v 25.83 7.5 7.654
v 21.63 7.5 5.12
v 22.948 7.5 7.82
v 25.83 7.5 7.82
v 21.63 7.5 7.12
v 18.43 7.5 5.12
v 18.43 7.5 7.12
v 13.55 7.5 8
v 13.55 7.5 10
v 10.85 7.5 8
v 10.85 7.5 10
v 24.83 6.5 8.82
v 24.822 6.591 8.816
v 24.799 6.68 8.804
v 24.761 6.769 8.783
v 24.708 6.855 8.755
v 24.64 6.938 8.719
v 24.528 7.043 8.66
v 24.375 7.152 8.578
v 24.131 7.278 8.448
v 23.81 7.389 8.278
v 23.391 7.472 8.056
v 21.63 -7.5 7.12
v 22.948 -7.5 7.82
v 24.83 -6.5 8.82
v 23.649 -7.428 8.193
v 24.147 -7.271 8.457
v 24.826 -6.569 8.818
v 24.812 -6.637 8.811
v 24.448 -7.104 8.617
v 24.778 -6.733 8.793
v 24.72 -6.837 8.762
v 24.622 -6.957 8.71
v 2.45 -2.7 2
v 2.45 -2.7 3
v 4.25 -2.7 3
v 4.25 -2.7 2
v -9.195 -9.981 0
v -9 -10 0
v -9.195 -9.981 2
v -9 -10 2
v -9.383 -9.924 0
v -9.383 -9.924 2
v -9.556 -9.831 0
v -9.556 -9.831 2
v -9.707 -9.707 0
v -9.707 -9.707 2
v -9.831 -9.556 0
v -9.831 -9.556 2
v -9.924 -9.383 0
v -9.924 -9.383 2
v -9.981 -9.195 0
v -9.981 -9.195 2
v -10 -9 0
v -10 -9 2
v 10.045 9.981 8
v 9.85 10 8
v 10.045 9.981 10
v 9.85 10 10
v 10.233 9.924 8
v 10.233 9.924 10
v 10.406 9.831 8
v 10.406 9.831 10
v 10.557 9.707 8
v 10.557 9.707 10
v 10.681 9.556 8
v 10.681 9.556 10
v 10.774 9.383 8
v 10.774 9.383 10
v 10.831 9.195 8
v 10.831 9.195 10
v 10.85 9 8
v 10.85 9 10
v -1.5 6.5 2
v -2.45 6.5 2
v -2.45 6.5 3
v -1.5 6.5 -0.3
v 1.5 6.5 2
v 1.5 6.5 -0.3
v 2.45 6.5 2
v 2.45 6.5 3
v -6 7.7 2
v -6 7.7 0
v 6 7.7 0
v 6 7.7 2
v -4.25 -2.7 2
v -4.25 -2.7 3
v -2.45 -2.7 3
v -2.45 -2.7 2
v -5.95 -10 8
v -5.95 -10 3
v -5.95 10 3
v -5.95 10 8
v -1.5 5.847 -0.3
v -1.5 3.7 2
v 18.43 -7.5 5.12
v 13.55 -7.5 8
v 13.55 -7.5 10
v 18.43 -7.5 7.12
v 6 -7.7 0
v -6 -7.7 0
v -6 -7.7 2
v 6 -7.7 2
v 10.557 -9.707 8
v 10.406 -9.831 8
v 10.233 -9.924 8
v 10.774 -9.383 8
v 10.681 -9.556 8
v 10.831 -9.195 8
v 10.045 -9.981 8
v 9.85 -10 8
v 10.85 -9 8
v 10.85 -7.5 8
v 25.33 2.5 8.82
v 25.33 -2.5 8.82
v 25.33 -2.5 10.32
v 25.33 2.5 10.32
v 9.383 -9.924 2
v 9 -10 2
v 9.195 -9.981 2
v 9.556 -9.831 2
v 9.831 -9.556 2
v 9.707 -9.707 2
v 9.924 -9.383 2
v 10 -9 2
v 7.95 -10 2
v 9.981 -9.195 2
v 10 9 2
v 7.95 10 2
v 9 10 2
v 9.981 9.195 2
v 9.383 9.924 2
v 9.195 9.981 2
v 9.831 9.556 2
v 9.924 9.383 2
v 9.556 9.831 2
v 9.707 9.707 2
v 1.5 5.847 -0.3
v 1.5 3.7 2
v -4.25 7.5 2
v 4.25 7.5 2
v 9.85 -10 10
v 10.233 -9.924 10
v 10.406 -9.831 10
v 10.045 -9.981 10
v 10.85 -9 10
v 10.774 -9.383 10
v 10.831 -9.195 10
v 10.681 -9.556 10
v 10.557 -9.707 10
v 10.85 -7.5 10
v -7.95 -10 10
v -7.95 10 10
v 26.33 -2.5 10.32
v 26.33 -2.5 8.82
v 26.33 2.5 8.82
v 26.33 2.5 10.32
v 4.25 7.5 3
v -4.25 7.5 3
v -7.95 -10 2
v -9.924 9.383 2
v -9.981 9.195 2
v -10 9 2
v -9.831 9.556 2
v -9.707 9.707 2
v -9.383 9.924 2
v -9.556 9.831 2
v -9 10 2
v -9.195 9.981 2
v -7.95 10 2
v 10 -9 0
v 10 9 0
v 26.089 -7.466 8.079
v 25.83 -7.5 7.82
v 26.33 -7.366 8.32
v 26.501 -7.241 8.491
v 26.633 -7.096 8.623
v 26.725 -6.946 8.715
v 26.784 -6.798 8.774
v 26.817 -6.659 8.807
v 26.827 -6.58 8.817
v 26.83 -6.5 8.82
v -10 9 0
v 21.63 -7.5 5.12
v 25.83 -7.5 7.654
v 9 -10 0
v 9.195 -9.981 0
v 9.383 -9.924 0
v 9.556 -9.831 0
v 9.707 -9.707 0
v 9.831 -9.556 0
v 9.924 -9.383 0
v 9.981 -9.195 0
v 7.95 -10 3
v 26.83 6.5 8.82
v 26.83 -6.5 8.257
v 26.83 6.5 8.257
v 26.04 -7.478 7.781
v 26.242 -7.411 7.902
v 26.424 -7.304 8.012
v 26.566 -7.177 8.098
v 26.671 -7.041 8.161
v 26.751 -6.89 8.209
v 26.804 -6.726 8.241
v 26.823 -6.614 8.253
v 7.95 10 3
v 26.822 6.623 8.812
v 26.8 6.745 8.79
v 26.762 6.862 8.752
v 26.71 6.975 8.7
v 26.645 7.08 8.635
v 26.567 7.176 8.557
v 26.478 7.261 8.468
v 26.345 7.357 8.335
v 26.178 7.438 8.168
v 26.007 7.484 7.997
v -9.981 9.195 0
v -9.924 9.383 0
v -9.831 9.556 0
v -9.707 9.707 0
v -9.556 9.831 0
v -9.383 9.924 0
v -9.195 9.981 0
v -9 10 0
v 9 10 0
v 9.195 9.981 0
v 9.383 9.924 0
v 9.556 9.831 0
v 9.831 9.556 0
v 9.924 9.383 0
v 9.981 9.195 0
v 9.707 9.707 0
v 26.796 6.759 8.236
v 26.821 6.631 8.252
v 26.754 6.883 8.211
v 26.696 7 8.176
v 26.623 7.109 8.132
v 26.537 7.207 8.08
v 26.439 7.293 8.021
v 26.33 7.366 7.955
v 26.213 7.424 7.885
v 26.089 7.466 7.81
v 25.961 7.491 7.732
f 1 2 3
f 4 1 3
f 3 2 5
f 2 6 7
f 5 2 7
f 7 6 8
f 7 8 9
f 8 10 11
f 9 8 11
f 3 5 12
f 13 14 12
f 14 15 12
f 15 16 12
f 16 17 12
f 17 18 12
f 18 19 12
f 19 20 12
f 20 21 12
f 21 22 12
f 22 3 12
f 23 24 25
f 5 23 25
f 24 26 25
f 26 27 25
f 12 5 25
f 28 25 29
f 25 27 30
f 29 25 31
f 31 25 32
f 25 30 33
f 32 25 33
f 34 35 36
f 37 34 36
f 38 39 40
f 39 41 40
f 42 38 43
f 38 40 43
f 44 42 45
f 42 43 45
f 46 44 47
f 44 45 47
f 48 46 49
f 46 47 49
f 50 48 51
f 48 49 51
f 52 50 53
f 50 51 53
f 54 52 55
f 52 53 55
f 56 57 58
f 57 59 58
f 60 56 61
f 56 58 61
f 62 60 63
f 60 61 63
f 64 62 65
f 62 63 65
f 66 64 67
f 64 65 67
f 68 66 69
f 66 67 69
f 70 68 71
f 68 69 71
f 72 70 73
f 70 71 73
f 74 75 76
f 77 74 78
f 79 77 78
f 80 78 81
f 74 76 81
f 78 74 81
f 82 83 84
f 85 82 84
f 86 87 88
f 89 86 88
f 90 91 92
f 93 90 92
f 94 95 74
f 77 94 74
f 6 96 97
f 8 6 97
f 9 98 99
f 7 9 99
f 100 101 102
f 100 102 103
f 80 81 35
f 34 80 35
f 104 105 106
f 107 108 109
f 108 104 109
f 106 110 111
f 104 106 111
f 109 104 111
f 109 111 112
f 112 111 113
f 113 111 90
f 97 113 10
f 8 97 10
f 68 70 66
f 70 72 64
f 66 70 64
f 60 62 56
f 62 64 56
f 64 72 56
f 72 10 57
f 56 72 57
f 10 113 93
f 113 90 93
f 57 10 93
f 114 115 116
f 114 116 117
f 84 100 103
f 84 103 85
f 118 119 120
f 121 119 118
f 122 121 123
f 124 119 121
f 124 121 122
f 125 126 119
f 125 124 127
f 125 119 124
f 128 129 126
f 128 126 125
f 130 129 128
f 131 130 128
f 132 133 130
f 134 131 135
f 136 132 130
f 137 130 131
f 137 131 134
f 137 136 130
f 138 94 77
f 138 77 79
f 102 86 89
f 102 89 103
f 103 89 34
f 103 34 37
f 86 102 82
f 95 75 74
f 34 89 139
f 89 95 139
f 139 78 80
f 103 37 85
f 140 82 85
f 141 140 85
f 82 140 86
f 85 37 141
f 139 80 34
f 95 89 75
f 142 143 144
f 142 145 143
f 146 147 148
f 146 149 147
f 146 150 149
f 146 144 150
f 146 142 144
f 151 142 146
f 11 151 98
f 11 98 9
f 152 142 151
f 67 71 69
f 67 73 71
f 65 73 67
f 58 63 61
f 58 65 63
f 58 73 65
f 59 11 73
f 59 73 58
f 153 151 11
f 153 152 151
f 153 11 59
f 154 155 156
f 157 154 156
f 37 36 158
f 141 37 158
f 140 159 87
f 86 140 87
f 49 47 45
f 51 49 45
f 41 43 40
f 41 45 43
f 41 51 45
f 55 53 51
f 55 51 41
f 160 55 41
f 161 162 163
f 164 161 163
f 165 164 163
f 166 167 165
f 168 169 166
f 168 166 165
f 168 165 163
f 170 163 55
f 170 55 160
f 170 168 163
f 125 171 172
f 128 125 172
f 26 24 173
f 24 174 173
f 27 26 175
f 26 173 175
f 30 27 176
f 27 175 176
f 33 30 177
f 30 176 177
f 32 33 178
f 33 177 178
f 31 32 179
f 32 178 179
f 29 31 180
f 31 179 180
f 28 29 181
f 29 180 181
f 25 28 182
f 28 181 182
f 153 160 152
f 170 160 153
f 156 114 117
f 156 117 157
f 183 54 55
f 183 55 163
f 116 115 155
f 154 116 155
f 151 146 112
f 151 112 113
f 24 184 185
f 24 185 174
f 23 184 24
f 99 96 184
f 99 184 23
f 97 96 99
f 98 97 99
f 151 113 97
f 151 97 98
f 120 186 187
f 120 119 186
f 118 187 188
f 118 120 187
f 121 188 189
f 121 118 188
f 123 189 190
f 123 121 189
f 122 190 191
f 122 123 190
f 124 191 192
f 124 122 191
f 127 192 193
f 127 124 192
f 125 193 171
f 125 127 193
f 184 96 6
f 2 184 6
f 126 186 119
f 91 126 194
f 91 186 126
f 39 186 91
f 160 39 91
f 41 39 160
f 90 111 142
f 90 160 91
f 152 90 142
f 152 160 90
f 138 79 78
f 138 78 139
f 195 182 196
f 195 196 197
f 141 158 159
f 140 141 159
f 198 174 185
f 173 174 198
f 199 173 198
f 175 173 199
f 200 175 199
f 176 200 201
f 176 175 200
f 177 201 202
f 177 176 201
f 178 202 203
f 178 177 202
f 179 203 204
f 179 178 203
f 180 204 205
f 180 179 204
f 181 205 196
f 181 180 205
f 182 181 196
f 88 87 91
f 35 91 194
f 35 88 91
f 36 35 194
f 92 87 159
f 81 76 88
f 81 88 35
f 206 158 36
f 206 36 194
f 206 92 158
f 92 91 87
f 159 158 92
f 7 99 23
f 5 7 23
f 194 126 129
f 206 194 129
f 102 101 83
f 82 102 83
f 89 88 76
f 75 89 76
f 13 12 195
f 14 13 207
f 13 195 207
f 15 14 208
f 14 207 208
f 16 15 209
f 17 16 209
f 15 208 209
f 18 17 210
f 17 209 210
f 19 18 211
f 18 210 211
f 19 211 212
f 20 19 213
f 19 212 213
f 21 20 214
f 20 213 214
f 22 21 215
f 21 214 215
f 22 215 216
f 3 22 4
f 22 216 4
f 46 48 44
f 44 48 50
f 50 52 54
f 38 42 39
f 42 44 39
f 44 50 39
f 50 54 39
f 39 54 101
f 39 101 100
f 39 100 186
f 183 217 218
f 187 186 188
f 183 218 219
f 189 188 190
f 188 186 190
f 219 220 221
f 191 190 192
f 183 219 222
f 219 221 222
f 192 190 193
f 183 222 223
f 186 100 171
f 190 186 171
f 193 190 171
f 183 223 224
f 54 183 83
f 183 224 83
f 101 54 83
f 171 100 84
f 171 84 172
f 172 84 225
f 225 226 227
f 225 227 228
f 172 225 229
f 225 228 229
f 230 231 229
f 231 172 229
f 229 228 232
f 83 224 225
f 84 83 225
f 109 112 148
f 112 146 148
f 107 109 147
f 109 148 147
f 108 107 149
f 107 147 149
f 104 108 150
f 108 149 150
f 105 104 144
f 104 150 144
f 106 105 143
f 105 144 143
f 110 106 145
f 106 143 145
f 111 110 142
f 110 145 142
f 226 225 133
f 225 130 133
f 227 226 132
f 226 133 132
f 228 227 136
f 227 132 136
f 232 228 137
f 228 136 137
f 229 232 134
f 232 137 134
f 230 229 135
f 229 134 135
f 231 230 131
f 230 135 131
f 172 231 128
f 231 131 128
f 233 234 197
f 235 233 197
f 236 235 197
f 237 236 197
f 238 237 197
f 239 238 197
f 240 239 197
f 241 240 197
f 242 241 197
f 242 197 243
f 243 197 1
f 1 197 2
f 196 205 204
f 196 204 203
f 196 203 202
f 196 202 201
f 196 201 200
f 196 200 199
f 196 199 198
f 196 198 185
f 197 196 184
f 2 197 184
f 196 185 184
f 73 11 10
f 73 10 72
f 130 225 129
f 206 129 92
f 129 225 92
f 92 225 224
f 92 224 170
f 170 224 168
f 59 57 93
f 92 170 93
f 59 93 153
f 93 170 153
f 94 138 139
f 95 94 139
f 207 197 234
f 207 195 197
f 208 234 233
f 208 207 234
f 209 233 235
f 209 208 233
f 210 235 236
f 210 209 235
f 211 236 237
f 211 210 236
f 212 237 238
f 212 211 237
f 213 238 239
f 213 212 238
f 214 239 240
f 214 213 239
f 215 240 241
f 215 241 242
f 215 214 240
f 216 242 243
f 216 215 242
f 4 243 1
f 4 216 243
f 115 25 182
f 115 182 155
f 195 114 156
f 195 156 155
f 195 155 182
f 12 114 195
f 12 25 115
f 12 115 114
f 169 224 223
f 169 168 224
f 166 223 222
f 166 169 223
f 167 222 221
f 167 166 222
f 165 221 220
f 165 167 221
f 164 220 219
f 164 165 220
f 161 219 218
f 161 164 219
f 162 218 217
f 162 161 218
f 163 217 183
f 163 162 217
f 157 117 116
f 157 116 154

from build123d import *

# Parameters (mm, degrees)
F0_W      = 20
F0_H      = 20
F0_W_2    = 12
F0_H_2    = 15.4
F1_DEPTH  = 2
F2_W      = 15.9
F2_H      = 20
F3_DEPTH  = 1
F4_W      = 2
F4_H      = 20
F5_DEPTH  = 7
F7_DEPTH  = 3.001
F9_DEPTH  = 2.3
F11_DEPTH = 4
F12_W     = 20
F12_H     = 2
F13_DEPTH = 16.8
F14_W     = 15
F14_H     = 2
F15_DEPTH = 2.7
F16_W     = 15
F16_H     = 2.88
F16_H_2   = 2
F17_DEPTH = 4.88
F19_DEPTH = 17.501
F20_W     = 15
F20_H     = 3.7
F21_DEPTH = 8.4
F23_DEPTH = 17.501
F24_W     = 1
F24_H     = 5
F25_DEPTH = 1.5
F26_R     = 1
F27_R     = 1


with BuildPart() as f1:
    # F0 (on Top) → F1 (new body)
    with BuildSketch(Plane.XY):
        Rectangle(F0_W, F0_H)
        Rectangle(F0_W_2, F0_H_2, mode=Mode.SUBTRACT)
    extrude(amount=F1_DEPTH)

    # F2 (on face) → F3 (join)
    with BuildSketch(Plane.XY.offset(2)):
        Rectangle(F2_W, F2_H)
    extrude(amount=F3_DEPTH)

    # F4 (on face) → F5 (join)
    with BuildSketch(Plane.XY.offset(3)):
        with Locations((-6.95, 0)):
            Rectangle(F4_W, F4_H)
    extrude(amount=F5_DEPTH)

    # F6 (on face) → F7 (cut, through all)
    with BuildSketch(Plane.XY.offset(3)):
        Polygon((0, 7.5), (-4.25, 7.5), (-4.25, -2.7), (-2.45, -2.7), (-2.45, 6.5), (0, 6.5), (2.45, 6.5), (2.45, -2.7), (4.25, -2.7), (4.25, 7.5), align=None)
    extrude(amount=-F7_DEPTH, mode=Mode.SUBTRACT)

    # F8 (on face) → F9 (join)
    with BuildSketch(Plane(origin=(0, 0, 2), x_dir=(1, 0, 0), z_dir=(0, 0, -1))):
        Polygon((1.5, -3.7), (0, -3.7), (-1.5, -3.7), (-1.5, -6.5), (1.5, -6.5), align=None)
    extrude(amount=F9_DEPTH)

    # F10 (on face) → F11 (cut)
    with BuildSketch(Plane.YZ.offset(1.5)):
        Polygon((5.847163, -0.3), (3.7, 2), (3.7, -0.3), align=None)
    extrude(amount=-F11_DEPTH, mode=Mode.SUBTRACT)

    # F12 (on face) → F13 (join)
    with BuildSketch(Plane.YZ.offset(-5.95)):
        with Locations((0, 9)):
            Rectangle(F12_W, F12_H)
    extrude(amount=F13_DEPTH)

    # F14 (on face) → F15 (join)
    with BuildSketch(Plane.YZ.offset(10.85)):
        with Locations((0, 9)):
            Rectangle(F14_W, F14_H)
    extrude(amount=F15_DEPTH)

    # F16 (on face) → F17 (join)
    with BuildSketch(Plane.YZ.offset(13.55)):
        with Locations((0, 6.56)):
            Rectangle(F16_W, F16_H)
        with Locations((0, 9)):
            Rectangle(F16_W, F16_H_2)
    extrude(amount=F17_DEPTH)

    # F18 (on face) → F19 (cut, through all)
    with BuildSketch(Plane.XZ.offset(7.5)):
        Polygon((18.43, 10), (13.55, 10), (18.43, 7.12), align=None)
        Polygon((18.43, 5.12), (13.55, 8), (13.55, 5.12), align=None)
    extrude(amount=-F19_DEPTH, mode=Mode.SUBTRACT)

    # F20 (on face) → F21 (join)
    with BuildSketch(Plane.YZ.offset(18.43)):
        with Locations((0, 6.97)):
            Rectangle(F20_W, F20_H)
    extrude(amount=F21_DEPTH)

    # F22 (on face) → F23 (cut, through all)
    with BuildSketch(Plane.XZ.offset(7.5)):
        Polygon((21.63, 7.12), (24.83, 8.82), (18.43, 8.82), (18.43, 7.12), align=None)
        Polygon((26.83, 5.12), (26.83, 8.256902), (21.63, 5.12), align=None)
    extrude(amount=-F23_DEPTH, mode=Mode.SUBTRACT)

    # F24 (on face) → F25 (join)
    with BuildSketch(Plane.XY.offset(8.82)):
        with Locations((25.83, 0)):
            Rectangle(F24_W, F24_H)
    extrude(amount=F25_DEPTH)

    # F26
    f26_edges = [f1.edges().sort_by_distance(p)[0] for p in [
        (25.83, -7.5, 8.82),
        (25.83, 7.5, 8.82),
        (26.83, -7.5, 8.538451),
        (26.83, 7.5, 8.538451),
    ]]
    fillet(f26_edges, radius=F26_R)

    # F27
    f27_edges = [f1.edges().sort_by_distance(p)[0] for p in [
        (10, -10, 1),
        (-10, -10, 1),
        (-10, 10, 1),
        (10, 10, 1),
        (10.85, 10, 9),
        (10.85, -10, 9),
    ]]
    fillet(f27_edges, radius=F27_R)


solid = f1.part
